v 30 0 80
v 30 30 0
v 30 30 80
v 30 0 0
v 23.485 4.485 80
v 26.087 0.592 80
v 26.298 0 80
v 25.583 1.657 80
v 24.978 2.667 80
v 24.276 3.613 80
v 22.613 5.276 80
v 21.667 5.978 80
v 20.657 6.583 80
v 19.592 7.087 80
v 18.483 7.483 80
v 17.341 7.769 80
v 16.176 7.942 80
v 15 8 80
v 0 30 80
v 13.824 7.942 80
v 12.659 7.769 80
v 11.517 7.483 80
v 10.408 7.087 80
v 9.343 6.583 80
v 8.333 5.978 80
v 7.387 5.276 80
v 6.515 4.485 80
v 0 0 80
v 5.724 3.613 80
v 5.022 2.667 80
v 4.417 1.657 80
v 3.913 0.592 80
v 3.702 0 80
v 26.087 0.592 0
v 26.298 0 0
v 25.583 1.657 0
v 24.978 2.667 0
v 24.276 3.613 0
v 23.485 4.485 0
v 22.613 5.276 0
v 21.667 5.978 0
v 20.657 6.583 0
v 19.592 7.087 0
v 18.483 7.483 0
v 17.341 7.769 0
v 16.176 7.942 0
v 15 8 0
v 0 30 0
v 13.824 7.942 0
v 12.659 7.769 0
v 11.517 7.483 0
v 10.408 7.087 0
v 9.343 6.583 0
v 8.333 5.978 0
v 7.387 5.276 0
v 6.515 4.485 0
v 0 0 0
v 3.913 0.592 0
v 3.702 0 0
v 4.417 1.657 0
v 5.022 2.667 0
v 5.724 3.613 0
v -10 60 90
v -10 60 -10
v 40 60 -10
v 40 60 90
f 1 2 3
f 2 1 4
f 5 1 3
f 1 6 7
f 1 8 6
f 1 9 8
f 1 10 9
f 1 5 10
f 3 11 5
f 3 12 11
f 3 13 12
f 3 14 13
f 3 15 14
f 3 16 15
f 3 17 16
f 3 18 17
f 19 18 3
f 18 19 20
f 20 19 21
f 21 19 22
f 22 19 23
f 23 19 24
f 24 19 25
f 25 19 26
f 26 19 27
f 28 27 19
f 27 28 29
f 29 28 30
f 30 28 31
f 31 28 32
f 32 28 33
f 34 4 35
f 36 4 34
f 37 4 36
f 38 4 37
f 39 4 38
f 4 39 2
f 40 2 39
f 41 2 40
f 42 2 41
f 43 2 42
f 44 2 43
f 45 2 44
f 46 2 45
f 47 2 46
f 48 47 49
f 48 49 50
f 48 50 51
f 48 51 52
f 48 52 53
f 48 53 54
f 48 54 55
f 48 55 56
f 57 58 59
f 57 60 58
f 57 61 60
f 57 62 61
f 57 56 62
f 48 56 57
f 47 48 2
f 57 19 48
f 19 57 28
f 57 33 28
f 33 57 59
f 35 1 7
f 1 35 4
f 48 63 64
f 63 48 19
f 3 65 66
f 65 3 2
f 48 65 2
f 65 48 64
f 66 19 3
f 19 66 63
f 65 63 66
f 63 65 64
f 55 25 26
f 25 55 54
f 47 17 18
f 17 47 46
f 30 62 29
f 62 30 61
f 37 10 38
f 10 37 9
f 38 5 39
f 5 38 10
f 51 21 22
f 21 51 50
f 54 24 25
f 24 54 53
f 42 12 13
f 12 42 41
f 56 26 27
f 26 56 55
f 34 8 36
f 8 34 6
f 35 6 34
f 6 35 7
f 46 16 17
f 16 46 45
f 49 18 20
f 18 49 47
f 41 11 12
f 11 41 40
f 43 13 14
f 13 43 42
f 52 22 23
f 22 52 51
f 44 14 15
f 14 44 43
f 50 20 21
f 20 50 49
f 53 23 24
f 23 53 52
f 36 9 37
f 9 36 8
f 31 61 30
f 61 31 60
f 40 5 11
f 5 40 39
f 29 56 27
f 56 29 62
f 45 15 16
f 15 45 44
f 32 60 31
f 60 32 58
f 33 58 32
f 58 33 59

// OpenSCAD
// ============================================================
// Wall mount bracket
// Mounts to wall with 3M tape, holds vertical wooden rod
// ============================================================

$fn = 64; // curve resolution

// --- Rod settings ---
rod_diameter = 24;    // diameter of the wooden rod (mm)
rod_inset = -4;       // how deep the rod sits into the notch (mm)
rod_clearance = 0;    // extra tolerance around rod (mm)

// --- Front face (small side, facing the rod) ---
front_width = 30;     // width of the front face (mm)
front_height = 80;    // height of the front face (mm)
front_depth = 30;     // depth of the straight section (mm)

// --- Back face (large side, against the wall) ---
back_extra = 20;      // how much wider/taller at the wall (mm)
back_taper = 30;      // depth of the tapered section (mm)

// --- General ---
wall = 3;             // wall thickness (mm)
corner_radius = 0;    // edge rounding radius (0 = sharp edges)

// --- Computed values ---
total_depth = front_depth + back_taper;
total_width = front_width + back_extra;
total_height = front_height + back_extra;

// ============================================================
difference() {
    intersection() {
        // Main body: straight section + tapered section toward wall
        minkowski() {
            union() {
                // Straight front section
                cube([front_width - corner_radius*2,
                      front_depth - corner_radius*2,
                      front_height - corner_radius*2]);

                // Tapered section (wider at the wall)
                translate([0, front_depth - corner_radius*2, 0])
                    hull() {
                        cube([front_width - corner_radius*2, wall, front_height - corner_radius*2]);
                        translate([-back_extra/2, back_taper, -back_extra/2])
                            cube([front_width + back_extra - corner_radius*2, wall, front_height + back_extra - corner_radius*2]);
                    }
            }
            sphere(r = corner_radius);
        }

        // Clip back face flat (for clean wall contact)
        translate([-total_width, 0, -total_height])
            cube([total_width*3, total_depth, total_height*3]);
    }

    // Vertical half-cylinder notch for rod
    translate([front_width/2 + corner_radius, rod_inset, -1])
        cylinder(h = front_height + 2, r = rod_diameter/2 + rod_clearance);

    // Open front face so rod can slide in
    translate([corner_radius, -1, -1])
        cube([front_width, rod_inset + rod_clearance, front_height + 2]);
}
